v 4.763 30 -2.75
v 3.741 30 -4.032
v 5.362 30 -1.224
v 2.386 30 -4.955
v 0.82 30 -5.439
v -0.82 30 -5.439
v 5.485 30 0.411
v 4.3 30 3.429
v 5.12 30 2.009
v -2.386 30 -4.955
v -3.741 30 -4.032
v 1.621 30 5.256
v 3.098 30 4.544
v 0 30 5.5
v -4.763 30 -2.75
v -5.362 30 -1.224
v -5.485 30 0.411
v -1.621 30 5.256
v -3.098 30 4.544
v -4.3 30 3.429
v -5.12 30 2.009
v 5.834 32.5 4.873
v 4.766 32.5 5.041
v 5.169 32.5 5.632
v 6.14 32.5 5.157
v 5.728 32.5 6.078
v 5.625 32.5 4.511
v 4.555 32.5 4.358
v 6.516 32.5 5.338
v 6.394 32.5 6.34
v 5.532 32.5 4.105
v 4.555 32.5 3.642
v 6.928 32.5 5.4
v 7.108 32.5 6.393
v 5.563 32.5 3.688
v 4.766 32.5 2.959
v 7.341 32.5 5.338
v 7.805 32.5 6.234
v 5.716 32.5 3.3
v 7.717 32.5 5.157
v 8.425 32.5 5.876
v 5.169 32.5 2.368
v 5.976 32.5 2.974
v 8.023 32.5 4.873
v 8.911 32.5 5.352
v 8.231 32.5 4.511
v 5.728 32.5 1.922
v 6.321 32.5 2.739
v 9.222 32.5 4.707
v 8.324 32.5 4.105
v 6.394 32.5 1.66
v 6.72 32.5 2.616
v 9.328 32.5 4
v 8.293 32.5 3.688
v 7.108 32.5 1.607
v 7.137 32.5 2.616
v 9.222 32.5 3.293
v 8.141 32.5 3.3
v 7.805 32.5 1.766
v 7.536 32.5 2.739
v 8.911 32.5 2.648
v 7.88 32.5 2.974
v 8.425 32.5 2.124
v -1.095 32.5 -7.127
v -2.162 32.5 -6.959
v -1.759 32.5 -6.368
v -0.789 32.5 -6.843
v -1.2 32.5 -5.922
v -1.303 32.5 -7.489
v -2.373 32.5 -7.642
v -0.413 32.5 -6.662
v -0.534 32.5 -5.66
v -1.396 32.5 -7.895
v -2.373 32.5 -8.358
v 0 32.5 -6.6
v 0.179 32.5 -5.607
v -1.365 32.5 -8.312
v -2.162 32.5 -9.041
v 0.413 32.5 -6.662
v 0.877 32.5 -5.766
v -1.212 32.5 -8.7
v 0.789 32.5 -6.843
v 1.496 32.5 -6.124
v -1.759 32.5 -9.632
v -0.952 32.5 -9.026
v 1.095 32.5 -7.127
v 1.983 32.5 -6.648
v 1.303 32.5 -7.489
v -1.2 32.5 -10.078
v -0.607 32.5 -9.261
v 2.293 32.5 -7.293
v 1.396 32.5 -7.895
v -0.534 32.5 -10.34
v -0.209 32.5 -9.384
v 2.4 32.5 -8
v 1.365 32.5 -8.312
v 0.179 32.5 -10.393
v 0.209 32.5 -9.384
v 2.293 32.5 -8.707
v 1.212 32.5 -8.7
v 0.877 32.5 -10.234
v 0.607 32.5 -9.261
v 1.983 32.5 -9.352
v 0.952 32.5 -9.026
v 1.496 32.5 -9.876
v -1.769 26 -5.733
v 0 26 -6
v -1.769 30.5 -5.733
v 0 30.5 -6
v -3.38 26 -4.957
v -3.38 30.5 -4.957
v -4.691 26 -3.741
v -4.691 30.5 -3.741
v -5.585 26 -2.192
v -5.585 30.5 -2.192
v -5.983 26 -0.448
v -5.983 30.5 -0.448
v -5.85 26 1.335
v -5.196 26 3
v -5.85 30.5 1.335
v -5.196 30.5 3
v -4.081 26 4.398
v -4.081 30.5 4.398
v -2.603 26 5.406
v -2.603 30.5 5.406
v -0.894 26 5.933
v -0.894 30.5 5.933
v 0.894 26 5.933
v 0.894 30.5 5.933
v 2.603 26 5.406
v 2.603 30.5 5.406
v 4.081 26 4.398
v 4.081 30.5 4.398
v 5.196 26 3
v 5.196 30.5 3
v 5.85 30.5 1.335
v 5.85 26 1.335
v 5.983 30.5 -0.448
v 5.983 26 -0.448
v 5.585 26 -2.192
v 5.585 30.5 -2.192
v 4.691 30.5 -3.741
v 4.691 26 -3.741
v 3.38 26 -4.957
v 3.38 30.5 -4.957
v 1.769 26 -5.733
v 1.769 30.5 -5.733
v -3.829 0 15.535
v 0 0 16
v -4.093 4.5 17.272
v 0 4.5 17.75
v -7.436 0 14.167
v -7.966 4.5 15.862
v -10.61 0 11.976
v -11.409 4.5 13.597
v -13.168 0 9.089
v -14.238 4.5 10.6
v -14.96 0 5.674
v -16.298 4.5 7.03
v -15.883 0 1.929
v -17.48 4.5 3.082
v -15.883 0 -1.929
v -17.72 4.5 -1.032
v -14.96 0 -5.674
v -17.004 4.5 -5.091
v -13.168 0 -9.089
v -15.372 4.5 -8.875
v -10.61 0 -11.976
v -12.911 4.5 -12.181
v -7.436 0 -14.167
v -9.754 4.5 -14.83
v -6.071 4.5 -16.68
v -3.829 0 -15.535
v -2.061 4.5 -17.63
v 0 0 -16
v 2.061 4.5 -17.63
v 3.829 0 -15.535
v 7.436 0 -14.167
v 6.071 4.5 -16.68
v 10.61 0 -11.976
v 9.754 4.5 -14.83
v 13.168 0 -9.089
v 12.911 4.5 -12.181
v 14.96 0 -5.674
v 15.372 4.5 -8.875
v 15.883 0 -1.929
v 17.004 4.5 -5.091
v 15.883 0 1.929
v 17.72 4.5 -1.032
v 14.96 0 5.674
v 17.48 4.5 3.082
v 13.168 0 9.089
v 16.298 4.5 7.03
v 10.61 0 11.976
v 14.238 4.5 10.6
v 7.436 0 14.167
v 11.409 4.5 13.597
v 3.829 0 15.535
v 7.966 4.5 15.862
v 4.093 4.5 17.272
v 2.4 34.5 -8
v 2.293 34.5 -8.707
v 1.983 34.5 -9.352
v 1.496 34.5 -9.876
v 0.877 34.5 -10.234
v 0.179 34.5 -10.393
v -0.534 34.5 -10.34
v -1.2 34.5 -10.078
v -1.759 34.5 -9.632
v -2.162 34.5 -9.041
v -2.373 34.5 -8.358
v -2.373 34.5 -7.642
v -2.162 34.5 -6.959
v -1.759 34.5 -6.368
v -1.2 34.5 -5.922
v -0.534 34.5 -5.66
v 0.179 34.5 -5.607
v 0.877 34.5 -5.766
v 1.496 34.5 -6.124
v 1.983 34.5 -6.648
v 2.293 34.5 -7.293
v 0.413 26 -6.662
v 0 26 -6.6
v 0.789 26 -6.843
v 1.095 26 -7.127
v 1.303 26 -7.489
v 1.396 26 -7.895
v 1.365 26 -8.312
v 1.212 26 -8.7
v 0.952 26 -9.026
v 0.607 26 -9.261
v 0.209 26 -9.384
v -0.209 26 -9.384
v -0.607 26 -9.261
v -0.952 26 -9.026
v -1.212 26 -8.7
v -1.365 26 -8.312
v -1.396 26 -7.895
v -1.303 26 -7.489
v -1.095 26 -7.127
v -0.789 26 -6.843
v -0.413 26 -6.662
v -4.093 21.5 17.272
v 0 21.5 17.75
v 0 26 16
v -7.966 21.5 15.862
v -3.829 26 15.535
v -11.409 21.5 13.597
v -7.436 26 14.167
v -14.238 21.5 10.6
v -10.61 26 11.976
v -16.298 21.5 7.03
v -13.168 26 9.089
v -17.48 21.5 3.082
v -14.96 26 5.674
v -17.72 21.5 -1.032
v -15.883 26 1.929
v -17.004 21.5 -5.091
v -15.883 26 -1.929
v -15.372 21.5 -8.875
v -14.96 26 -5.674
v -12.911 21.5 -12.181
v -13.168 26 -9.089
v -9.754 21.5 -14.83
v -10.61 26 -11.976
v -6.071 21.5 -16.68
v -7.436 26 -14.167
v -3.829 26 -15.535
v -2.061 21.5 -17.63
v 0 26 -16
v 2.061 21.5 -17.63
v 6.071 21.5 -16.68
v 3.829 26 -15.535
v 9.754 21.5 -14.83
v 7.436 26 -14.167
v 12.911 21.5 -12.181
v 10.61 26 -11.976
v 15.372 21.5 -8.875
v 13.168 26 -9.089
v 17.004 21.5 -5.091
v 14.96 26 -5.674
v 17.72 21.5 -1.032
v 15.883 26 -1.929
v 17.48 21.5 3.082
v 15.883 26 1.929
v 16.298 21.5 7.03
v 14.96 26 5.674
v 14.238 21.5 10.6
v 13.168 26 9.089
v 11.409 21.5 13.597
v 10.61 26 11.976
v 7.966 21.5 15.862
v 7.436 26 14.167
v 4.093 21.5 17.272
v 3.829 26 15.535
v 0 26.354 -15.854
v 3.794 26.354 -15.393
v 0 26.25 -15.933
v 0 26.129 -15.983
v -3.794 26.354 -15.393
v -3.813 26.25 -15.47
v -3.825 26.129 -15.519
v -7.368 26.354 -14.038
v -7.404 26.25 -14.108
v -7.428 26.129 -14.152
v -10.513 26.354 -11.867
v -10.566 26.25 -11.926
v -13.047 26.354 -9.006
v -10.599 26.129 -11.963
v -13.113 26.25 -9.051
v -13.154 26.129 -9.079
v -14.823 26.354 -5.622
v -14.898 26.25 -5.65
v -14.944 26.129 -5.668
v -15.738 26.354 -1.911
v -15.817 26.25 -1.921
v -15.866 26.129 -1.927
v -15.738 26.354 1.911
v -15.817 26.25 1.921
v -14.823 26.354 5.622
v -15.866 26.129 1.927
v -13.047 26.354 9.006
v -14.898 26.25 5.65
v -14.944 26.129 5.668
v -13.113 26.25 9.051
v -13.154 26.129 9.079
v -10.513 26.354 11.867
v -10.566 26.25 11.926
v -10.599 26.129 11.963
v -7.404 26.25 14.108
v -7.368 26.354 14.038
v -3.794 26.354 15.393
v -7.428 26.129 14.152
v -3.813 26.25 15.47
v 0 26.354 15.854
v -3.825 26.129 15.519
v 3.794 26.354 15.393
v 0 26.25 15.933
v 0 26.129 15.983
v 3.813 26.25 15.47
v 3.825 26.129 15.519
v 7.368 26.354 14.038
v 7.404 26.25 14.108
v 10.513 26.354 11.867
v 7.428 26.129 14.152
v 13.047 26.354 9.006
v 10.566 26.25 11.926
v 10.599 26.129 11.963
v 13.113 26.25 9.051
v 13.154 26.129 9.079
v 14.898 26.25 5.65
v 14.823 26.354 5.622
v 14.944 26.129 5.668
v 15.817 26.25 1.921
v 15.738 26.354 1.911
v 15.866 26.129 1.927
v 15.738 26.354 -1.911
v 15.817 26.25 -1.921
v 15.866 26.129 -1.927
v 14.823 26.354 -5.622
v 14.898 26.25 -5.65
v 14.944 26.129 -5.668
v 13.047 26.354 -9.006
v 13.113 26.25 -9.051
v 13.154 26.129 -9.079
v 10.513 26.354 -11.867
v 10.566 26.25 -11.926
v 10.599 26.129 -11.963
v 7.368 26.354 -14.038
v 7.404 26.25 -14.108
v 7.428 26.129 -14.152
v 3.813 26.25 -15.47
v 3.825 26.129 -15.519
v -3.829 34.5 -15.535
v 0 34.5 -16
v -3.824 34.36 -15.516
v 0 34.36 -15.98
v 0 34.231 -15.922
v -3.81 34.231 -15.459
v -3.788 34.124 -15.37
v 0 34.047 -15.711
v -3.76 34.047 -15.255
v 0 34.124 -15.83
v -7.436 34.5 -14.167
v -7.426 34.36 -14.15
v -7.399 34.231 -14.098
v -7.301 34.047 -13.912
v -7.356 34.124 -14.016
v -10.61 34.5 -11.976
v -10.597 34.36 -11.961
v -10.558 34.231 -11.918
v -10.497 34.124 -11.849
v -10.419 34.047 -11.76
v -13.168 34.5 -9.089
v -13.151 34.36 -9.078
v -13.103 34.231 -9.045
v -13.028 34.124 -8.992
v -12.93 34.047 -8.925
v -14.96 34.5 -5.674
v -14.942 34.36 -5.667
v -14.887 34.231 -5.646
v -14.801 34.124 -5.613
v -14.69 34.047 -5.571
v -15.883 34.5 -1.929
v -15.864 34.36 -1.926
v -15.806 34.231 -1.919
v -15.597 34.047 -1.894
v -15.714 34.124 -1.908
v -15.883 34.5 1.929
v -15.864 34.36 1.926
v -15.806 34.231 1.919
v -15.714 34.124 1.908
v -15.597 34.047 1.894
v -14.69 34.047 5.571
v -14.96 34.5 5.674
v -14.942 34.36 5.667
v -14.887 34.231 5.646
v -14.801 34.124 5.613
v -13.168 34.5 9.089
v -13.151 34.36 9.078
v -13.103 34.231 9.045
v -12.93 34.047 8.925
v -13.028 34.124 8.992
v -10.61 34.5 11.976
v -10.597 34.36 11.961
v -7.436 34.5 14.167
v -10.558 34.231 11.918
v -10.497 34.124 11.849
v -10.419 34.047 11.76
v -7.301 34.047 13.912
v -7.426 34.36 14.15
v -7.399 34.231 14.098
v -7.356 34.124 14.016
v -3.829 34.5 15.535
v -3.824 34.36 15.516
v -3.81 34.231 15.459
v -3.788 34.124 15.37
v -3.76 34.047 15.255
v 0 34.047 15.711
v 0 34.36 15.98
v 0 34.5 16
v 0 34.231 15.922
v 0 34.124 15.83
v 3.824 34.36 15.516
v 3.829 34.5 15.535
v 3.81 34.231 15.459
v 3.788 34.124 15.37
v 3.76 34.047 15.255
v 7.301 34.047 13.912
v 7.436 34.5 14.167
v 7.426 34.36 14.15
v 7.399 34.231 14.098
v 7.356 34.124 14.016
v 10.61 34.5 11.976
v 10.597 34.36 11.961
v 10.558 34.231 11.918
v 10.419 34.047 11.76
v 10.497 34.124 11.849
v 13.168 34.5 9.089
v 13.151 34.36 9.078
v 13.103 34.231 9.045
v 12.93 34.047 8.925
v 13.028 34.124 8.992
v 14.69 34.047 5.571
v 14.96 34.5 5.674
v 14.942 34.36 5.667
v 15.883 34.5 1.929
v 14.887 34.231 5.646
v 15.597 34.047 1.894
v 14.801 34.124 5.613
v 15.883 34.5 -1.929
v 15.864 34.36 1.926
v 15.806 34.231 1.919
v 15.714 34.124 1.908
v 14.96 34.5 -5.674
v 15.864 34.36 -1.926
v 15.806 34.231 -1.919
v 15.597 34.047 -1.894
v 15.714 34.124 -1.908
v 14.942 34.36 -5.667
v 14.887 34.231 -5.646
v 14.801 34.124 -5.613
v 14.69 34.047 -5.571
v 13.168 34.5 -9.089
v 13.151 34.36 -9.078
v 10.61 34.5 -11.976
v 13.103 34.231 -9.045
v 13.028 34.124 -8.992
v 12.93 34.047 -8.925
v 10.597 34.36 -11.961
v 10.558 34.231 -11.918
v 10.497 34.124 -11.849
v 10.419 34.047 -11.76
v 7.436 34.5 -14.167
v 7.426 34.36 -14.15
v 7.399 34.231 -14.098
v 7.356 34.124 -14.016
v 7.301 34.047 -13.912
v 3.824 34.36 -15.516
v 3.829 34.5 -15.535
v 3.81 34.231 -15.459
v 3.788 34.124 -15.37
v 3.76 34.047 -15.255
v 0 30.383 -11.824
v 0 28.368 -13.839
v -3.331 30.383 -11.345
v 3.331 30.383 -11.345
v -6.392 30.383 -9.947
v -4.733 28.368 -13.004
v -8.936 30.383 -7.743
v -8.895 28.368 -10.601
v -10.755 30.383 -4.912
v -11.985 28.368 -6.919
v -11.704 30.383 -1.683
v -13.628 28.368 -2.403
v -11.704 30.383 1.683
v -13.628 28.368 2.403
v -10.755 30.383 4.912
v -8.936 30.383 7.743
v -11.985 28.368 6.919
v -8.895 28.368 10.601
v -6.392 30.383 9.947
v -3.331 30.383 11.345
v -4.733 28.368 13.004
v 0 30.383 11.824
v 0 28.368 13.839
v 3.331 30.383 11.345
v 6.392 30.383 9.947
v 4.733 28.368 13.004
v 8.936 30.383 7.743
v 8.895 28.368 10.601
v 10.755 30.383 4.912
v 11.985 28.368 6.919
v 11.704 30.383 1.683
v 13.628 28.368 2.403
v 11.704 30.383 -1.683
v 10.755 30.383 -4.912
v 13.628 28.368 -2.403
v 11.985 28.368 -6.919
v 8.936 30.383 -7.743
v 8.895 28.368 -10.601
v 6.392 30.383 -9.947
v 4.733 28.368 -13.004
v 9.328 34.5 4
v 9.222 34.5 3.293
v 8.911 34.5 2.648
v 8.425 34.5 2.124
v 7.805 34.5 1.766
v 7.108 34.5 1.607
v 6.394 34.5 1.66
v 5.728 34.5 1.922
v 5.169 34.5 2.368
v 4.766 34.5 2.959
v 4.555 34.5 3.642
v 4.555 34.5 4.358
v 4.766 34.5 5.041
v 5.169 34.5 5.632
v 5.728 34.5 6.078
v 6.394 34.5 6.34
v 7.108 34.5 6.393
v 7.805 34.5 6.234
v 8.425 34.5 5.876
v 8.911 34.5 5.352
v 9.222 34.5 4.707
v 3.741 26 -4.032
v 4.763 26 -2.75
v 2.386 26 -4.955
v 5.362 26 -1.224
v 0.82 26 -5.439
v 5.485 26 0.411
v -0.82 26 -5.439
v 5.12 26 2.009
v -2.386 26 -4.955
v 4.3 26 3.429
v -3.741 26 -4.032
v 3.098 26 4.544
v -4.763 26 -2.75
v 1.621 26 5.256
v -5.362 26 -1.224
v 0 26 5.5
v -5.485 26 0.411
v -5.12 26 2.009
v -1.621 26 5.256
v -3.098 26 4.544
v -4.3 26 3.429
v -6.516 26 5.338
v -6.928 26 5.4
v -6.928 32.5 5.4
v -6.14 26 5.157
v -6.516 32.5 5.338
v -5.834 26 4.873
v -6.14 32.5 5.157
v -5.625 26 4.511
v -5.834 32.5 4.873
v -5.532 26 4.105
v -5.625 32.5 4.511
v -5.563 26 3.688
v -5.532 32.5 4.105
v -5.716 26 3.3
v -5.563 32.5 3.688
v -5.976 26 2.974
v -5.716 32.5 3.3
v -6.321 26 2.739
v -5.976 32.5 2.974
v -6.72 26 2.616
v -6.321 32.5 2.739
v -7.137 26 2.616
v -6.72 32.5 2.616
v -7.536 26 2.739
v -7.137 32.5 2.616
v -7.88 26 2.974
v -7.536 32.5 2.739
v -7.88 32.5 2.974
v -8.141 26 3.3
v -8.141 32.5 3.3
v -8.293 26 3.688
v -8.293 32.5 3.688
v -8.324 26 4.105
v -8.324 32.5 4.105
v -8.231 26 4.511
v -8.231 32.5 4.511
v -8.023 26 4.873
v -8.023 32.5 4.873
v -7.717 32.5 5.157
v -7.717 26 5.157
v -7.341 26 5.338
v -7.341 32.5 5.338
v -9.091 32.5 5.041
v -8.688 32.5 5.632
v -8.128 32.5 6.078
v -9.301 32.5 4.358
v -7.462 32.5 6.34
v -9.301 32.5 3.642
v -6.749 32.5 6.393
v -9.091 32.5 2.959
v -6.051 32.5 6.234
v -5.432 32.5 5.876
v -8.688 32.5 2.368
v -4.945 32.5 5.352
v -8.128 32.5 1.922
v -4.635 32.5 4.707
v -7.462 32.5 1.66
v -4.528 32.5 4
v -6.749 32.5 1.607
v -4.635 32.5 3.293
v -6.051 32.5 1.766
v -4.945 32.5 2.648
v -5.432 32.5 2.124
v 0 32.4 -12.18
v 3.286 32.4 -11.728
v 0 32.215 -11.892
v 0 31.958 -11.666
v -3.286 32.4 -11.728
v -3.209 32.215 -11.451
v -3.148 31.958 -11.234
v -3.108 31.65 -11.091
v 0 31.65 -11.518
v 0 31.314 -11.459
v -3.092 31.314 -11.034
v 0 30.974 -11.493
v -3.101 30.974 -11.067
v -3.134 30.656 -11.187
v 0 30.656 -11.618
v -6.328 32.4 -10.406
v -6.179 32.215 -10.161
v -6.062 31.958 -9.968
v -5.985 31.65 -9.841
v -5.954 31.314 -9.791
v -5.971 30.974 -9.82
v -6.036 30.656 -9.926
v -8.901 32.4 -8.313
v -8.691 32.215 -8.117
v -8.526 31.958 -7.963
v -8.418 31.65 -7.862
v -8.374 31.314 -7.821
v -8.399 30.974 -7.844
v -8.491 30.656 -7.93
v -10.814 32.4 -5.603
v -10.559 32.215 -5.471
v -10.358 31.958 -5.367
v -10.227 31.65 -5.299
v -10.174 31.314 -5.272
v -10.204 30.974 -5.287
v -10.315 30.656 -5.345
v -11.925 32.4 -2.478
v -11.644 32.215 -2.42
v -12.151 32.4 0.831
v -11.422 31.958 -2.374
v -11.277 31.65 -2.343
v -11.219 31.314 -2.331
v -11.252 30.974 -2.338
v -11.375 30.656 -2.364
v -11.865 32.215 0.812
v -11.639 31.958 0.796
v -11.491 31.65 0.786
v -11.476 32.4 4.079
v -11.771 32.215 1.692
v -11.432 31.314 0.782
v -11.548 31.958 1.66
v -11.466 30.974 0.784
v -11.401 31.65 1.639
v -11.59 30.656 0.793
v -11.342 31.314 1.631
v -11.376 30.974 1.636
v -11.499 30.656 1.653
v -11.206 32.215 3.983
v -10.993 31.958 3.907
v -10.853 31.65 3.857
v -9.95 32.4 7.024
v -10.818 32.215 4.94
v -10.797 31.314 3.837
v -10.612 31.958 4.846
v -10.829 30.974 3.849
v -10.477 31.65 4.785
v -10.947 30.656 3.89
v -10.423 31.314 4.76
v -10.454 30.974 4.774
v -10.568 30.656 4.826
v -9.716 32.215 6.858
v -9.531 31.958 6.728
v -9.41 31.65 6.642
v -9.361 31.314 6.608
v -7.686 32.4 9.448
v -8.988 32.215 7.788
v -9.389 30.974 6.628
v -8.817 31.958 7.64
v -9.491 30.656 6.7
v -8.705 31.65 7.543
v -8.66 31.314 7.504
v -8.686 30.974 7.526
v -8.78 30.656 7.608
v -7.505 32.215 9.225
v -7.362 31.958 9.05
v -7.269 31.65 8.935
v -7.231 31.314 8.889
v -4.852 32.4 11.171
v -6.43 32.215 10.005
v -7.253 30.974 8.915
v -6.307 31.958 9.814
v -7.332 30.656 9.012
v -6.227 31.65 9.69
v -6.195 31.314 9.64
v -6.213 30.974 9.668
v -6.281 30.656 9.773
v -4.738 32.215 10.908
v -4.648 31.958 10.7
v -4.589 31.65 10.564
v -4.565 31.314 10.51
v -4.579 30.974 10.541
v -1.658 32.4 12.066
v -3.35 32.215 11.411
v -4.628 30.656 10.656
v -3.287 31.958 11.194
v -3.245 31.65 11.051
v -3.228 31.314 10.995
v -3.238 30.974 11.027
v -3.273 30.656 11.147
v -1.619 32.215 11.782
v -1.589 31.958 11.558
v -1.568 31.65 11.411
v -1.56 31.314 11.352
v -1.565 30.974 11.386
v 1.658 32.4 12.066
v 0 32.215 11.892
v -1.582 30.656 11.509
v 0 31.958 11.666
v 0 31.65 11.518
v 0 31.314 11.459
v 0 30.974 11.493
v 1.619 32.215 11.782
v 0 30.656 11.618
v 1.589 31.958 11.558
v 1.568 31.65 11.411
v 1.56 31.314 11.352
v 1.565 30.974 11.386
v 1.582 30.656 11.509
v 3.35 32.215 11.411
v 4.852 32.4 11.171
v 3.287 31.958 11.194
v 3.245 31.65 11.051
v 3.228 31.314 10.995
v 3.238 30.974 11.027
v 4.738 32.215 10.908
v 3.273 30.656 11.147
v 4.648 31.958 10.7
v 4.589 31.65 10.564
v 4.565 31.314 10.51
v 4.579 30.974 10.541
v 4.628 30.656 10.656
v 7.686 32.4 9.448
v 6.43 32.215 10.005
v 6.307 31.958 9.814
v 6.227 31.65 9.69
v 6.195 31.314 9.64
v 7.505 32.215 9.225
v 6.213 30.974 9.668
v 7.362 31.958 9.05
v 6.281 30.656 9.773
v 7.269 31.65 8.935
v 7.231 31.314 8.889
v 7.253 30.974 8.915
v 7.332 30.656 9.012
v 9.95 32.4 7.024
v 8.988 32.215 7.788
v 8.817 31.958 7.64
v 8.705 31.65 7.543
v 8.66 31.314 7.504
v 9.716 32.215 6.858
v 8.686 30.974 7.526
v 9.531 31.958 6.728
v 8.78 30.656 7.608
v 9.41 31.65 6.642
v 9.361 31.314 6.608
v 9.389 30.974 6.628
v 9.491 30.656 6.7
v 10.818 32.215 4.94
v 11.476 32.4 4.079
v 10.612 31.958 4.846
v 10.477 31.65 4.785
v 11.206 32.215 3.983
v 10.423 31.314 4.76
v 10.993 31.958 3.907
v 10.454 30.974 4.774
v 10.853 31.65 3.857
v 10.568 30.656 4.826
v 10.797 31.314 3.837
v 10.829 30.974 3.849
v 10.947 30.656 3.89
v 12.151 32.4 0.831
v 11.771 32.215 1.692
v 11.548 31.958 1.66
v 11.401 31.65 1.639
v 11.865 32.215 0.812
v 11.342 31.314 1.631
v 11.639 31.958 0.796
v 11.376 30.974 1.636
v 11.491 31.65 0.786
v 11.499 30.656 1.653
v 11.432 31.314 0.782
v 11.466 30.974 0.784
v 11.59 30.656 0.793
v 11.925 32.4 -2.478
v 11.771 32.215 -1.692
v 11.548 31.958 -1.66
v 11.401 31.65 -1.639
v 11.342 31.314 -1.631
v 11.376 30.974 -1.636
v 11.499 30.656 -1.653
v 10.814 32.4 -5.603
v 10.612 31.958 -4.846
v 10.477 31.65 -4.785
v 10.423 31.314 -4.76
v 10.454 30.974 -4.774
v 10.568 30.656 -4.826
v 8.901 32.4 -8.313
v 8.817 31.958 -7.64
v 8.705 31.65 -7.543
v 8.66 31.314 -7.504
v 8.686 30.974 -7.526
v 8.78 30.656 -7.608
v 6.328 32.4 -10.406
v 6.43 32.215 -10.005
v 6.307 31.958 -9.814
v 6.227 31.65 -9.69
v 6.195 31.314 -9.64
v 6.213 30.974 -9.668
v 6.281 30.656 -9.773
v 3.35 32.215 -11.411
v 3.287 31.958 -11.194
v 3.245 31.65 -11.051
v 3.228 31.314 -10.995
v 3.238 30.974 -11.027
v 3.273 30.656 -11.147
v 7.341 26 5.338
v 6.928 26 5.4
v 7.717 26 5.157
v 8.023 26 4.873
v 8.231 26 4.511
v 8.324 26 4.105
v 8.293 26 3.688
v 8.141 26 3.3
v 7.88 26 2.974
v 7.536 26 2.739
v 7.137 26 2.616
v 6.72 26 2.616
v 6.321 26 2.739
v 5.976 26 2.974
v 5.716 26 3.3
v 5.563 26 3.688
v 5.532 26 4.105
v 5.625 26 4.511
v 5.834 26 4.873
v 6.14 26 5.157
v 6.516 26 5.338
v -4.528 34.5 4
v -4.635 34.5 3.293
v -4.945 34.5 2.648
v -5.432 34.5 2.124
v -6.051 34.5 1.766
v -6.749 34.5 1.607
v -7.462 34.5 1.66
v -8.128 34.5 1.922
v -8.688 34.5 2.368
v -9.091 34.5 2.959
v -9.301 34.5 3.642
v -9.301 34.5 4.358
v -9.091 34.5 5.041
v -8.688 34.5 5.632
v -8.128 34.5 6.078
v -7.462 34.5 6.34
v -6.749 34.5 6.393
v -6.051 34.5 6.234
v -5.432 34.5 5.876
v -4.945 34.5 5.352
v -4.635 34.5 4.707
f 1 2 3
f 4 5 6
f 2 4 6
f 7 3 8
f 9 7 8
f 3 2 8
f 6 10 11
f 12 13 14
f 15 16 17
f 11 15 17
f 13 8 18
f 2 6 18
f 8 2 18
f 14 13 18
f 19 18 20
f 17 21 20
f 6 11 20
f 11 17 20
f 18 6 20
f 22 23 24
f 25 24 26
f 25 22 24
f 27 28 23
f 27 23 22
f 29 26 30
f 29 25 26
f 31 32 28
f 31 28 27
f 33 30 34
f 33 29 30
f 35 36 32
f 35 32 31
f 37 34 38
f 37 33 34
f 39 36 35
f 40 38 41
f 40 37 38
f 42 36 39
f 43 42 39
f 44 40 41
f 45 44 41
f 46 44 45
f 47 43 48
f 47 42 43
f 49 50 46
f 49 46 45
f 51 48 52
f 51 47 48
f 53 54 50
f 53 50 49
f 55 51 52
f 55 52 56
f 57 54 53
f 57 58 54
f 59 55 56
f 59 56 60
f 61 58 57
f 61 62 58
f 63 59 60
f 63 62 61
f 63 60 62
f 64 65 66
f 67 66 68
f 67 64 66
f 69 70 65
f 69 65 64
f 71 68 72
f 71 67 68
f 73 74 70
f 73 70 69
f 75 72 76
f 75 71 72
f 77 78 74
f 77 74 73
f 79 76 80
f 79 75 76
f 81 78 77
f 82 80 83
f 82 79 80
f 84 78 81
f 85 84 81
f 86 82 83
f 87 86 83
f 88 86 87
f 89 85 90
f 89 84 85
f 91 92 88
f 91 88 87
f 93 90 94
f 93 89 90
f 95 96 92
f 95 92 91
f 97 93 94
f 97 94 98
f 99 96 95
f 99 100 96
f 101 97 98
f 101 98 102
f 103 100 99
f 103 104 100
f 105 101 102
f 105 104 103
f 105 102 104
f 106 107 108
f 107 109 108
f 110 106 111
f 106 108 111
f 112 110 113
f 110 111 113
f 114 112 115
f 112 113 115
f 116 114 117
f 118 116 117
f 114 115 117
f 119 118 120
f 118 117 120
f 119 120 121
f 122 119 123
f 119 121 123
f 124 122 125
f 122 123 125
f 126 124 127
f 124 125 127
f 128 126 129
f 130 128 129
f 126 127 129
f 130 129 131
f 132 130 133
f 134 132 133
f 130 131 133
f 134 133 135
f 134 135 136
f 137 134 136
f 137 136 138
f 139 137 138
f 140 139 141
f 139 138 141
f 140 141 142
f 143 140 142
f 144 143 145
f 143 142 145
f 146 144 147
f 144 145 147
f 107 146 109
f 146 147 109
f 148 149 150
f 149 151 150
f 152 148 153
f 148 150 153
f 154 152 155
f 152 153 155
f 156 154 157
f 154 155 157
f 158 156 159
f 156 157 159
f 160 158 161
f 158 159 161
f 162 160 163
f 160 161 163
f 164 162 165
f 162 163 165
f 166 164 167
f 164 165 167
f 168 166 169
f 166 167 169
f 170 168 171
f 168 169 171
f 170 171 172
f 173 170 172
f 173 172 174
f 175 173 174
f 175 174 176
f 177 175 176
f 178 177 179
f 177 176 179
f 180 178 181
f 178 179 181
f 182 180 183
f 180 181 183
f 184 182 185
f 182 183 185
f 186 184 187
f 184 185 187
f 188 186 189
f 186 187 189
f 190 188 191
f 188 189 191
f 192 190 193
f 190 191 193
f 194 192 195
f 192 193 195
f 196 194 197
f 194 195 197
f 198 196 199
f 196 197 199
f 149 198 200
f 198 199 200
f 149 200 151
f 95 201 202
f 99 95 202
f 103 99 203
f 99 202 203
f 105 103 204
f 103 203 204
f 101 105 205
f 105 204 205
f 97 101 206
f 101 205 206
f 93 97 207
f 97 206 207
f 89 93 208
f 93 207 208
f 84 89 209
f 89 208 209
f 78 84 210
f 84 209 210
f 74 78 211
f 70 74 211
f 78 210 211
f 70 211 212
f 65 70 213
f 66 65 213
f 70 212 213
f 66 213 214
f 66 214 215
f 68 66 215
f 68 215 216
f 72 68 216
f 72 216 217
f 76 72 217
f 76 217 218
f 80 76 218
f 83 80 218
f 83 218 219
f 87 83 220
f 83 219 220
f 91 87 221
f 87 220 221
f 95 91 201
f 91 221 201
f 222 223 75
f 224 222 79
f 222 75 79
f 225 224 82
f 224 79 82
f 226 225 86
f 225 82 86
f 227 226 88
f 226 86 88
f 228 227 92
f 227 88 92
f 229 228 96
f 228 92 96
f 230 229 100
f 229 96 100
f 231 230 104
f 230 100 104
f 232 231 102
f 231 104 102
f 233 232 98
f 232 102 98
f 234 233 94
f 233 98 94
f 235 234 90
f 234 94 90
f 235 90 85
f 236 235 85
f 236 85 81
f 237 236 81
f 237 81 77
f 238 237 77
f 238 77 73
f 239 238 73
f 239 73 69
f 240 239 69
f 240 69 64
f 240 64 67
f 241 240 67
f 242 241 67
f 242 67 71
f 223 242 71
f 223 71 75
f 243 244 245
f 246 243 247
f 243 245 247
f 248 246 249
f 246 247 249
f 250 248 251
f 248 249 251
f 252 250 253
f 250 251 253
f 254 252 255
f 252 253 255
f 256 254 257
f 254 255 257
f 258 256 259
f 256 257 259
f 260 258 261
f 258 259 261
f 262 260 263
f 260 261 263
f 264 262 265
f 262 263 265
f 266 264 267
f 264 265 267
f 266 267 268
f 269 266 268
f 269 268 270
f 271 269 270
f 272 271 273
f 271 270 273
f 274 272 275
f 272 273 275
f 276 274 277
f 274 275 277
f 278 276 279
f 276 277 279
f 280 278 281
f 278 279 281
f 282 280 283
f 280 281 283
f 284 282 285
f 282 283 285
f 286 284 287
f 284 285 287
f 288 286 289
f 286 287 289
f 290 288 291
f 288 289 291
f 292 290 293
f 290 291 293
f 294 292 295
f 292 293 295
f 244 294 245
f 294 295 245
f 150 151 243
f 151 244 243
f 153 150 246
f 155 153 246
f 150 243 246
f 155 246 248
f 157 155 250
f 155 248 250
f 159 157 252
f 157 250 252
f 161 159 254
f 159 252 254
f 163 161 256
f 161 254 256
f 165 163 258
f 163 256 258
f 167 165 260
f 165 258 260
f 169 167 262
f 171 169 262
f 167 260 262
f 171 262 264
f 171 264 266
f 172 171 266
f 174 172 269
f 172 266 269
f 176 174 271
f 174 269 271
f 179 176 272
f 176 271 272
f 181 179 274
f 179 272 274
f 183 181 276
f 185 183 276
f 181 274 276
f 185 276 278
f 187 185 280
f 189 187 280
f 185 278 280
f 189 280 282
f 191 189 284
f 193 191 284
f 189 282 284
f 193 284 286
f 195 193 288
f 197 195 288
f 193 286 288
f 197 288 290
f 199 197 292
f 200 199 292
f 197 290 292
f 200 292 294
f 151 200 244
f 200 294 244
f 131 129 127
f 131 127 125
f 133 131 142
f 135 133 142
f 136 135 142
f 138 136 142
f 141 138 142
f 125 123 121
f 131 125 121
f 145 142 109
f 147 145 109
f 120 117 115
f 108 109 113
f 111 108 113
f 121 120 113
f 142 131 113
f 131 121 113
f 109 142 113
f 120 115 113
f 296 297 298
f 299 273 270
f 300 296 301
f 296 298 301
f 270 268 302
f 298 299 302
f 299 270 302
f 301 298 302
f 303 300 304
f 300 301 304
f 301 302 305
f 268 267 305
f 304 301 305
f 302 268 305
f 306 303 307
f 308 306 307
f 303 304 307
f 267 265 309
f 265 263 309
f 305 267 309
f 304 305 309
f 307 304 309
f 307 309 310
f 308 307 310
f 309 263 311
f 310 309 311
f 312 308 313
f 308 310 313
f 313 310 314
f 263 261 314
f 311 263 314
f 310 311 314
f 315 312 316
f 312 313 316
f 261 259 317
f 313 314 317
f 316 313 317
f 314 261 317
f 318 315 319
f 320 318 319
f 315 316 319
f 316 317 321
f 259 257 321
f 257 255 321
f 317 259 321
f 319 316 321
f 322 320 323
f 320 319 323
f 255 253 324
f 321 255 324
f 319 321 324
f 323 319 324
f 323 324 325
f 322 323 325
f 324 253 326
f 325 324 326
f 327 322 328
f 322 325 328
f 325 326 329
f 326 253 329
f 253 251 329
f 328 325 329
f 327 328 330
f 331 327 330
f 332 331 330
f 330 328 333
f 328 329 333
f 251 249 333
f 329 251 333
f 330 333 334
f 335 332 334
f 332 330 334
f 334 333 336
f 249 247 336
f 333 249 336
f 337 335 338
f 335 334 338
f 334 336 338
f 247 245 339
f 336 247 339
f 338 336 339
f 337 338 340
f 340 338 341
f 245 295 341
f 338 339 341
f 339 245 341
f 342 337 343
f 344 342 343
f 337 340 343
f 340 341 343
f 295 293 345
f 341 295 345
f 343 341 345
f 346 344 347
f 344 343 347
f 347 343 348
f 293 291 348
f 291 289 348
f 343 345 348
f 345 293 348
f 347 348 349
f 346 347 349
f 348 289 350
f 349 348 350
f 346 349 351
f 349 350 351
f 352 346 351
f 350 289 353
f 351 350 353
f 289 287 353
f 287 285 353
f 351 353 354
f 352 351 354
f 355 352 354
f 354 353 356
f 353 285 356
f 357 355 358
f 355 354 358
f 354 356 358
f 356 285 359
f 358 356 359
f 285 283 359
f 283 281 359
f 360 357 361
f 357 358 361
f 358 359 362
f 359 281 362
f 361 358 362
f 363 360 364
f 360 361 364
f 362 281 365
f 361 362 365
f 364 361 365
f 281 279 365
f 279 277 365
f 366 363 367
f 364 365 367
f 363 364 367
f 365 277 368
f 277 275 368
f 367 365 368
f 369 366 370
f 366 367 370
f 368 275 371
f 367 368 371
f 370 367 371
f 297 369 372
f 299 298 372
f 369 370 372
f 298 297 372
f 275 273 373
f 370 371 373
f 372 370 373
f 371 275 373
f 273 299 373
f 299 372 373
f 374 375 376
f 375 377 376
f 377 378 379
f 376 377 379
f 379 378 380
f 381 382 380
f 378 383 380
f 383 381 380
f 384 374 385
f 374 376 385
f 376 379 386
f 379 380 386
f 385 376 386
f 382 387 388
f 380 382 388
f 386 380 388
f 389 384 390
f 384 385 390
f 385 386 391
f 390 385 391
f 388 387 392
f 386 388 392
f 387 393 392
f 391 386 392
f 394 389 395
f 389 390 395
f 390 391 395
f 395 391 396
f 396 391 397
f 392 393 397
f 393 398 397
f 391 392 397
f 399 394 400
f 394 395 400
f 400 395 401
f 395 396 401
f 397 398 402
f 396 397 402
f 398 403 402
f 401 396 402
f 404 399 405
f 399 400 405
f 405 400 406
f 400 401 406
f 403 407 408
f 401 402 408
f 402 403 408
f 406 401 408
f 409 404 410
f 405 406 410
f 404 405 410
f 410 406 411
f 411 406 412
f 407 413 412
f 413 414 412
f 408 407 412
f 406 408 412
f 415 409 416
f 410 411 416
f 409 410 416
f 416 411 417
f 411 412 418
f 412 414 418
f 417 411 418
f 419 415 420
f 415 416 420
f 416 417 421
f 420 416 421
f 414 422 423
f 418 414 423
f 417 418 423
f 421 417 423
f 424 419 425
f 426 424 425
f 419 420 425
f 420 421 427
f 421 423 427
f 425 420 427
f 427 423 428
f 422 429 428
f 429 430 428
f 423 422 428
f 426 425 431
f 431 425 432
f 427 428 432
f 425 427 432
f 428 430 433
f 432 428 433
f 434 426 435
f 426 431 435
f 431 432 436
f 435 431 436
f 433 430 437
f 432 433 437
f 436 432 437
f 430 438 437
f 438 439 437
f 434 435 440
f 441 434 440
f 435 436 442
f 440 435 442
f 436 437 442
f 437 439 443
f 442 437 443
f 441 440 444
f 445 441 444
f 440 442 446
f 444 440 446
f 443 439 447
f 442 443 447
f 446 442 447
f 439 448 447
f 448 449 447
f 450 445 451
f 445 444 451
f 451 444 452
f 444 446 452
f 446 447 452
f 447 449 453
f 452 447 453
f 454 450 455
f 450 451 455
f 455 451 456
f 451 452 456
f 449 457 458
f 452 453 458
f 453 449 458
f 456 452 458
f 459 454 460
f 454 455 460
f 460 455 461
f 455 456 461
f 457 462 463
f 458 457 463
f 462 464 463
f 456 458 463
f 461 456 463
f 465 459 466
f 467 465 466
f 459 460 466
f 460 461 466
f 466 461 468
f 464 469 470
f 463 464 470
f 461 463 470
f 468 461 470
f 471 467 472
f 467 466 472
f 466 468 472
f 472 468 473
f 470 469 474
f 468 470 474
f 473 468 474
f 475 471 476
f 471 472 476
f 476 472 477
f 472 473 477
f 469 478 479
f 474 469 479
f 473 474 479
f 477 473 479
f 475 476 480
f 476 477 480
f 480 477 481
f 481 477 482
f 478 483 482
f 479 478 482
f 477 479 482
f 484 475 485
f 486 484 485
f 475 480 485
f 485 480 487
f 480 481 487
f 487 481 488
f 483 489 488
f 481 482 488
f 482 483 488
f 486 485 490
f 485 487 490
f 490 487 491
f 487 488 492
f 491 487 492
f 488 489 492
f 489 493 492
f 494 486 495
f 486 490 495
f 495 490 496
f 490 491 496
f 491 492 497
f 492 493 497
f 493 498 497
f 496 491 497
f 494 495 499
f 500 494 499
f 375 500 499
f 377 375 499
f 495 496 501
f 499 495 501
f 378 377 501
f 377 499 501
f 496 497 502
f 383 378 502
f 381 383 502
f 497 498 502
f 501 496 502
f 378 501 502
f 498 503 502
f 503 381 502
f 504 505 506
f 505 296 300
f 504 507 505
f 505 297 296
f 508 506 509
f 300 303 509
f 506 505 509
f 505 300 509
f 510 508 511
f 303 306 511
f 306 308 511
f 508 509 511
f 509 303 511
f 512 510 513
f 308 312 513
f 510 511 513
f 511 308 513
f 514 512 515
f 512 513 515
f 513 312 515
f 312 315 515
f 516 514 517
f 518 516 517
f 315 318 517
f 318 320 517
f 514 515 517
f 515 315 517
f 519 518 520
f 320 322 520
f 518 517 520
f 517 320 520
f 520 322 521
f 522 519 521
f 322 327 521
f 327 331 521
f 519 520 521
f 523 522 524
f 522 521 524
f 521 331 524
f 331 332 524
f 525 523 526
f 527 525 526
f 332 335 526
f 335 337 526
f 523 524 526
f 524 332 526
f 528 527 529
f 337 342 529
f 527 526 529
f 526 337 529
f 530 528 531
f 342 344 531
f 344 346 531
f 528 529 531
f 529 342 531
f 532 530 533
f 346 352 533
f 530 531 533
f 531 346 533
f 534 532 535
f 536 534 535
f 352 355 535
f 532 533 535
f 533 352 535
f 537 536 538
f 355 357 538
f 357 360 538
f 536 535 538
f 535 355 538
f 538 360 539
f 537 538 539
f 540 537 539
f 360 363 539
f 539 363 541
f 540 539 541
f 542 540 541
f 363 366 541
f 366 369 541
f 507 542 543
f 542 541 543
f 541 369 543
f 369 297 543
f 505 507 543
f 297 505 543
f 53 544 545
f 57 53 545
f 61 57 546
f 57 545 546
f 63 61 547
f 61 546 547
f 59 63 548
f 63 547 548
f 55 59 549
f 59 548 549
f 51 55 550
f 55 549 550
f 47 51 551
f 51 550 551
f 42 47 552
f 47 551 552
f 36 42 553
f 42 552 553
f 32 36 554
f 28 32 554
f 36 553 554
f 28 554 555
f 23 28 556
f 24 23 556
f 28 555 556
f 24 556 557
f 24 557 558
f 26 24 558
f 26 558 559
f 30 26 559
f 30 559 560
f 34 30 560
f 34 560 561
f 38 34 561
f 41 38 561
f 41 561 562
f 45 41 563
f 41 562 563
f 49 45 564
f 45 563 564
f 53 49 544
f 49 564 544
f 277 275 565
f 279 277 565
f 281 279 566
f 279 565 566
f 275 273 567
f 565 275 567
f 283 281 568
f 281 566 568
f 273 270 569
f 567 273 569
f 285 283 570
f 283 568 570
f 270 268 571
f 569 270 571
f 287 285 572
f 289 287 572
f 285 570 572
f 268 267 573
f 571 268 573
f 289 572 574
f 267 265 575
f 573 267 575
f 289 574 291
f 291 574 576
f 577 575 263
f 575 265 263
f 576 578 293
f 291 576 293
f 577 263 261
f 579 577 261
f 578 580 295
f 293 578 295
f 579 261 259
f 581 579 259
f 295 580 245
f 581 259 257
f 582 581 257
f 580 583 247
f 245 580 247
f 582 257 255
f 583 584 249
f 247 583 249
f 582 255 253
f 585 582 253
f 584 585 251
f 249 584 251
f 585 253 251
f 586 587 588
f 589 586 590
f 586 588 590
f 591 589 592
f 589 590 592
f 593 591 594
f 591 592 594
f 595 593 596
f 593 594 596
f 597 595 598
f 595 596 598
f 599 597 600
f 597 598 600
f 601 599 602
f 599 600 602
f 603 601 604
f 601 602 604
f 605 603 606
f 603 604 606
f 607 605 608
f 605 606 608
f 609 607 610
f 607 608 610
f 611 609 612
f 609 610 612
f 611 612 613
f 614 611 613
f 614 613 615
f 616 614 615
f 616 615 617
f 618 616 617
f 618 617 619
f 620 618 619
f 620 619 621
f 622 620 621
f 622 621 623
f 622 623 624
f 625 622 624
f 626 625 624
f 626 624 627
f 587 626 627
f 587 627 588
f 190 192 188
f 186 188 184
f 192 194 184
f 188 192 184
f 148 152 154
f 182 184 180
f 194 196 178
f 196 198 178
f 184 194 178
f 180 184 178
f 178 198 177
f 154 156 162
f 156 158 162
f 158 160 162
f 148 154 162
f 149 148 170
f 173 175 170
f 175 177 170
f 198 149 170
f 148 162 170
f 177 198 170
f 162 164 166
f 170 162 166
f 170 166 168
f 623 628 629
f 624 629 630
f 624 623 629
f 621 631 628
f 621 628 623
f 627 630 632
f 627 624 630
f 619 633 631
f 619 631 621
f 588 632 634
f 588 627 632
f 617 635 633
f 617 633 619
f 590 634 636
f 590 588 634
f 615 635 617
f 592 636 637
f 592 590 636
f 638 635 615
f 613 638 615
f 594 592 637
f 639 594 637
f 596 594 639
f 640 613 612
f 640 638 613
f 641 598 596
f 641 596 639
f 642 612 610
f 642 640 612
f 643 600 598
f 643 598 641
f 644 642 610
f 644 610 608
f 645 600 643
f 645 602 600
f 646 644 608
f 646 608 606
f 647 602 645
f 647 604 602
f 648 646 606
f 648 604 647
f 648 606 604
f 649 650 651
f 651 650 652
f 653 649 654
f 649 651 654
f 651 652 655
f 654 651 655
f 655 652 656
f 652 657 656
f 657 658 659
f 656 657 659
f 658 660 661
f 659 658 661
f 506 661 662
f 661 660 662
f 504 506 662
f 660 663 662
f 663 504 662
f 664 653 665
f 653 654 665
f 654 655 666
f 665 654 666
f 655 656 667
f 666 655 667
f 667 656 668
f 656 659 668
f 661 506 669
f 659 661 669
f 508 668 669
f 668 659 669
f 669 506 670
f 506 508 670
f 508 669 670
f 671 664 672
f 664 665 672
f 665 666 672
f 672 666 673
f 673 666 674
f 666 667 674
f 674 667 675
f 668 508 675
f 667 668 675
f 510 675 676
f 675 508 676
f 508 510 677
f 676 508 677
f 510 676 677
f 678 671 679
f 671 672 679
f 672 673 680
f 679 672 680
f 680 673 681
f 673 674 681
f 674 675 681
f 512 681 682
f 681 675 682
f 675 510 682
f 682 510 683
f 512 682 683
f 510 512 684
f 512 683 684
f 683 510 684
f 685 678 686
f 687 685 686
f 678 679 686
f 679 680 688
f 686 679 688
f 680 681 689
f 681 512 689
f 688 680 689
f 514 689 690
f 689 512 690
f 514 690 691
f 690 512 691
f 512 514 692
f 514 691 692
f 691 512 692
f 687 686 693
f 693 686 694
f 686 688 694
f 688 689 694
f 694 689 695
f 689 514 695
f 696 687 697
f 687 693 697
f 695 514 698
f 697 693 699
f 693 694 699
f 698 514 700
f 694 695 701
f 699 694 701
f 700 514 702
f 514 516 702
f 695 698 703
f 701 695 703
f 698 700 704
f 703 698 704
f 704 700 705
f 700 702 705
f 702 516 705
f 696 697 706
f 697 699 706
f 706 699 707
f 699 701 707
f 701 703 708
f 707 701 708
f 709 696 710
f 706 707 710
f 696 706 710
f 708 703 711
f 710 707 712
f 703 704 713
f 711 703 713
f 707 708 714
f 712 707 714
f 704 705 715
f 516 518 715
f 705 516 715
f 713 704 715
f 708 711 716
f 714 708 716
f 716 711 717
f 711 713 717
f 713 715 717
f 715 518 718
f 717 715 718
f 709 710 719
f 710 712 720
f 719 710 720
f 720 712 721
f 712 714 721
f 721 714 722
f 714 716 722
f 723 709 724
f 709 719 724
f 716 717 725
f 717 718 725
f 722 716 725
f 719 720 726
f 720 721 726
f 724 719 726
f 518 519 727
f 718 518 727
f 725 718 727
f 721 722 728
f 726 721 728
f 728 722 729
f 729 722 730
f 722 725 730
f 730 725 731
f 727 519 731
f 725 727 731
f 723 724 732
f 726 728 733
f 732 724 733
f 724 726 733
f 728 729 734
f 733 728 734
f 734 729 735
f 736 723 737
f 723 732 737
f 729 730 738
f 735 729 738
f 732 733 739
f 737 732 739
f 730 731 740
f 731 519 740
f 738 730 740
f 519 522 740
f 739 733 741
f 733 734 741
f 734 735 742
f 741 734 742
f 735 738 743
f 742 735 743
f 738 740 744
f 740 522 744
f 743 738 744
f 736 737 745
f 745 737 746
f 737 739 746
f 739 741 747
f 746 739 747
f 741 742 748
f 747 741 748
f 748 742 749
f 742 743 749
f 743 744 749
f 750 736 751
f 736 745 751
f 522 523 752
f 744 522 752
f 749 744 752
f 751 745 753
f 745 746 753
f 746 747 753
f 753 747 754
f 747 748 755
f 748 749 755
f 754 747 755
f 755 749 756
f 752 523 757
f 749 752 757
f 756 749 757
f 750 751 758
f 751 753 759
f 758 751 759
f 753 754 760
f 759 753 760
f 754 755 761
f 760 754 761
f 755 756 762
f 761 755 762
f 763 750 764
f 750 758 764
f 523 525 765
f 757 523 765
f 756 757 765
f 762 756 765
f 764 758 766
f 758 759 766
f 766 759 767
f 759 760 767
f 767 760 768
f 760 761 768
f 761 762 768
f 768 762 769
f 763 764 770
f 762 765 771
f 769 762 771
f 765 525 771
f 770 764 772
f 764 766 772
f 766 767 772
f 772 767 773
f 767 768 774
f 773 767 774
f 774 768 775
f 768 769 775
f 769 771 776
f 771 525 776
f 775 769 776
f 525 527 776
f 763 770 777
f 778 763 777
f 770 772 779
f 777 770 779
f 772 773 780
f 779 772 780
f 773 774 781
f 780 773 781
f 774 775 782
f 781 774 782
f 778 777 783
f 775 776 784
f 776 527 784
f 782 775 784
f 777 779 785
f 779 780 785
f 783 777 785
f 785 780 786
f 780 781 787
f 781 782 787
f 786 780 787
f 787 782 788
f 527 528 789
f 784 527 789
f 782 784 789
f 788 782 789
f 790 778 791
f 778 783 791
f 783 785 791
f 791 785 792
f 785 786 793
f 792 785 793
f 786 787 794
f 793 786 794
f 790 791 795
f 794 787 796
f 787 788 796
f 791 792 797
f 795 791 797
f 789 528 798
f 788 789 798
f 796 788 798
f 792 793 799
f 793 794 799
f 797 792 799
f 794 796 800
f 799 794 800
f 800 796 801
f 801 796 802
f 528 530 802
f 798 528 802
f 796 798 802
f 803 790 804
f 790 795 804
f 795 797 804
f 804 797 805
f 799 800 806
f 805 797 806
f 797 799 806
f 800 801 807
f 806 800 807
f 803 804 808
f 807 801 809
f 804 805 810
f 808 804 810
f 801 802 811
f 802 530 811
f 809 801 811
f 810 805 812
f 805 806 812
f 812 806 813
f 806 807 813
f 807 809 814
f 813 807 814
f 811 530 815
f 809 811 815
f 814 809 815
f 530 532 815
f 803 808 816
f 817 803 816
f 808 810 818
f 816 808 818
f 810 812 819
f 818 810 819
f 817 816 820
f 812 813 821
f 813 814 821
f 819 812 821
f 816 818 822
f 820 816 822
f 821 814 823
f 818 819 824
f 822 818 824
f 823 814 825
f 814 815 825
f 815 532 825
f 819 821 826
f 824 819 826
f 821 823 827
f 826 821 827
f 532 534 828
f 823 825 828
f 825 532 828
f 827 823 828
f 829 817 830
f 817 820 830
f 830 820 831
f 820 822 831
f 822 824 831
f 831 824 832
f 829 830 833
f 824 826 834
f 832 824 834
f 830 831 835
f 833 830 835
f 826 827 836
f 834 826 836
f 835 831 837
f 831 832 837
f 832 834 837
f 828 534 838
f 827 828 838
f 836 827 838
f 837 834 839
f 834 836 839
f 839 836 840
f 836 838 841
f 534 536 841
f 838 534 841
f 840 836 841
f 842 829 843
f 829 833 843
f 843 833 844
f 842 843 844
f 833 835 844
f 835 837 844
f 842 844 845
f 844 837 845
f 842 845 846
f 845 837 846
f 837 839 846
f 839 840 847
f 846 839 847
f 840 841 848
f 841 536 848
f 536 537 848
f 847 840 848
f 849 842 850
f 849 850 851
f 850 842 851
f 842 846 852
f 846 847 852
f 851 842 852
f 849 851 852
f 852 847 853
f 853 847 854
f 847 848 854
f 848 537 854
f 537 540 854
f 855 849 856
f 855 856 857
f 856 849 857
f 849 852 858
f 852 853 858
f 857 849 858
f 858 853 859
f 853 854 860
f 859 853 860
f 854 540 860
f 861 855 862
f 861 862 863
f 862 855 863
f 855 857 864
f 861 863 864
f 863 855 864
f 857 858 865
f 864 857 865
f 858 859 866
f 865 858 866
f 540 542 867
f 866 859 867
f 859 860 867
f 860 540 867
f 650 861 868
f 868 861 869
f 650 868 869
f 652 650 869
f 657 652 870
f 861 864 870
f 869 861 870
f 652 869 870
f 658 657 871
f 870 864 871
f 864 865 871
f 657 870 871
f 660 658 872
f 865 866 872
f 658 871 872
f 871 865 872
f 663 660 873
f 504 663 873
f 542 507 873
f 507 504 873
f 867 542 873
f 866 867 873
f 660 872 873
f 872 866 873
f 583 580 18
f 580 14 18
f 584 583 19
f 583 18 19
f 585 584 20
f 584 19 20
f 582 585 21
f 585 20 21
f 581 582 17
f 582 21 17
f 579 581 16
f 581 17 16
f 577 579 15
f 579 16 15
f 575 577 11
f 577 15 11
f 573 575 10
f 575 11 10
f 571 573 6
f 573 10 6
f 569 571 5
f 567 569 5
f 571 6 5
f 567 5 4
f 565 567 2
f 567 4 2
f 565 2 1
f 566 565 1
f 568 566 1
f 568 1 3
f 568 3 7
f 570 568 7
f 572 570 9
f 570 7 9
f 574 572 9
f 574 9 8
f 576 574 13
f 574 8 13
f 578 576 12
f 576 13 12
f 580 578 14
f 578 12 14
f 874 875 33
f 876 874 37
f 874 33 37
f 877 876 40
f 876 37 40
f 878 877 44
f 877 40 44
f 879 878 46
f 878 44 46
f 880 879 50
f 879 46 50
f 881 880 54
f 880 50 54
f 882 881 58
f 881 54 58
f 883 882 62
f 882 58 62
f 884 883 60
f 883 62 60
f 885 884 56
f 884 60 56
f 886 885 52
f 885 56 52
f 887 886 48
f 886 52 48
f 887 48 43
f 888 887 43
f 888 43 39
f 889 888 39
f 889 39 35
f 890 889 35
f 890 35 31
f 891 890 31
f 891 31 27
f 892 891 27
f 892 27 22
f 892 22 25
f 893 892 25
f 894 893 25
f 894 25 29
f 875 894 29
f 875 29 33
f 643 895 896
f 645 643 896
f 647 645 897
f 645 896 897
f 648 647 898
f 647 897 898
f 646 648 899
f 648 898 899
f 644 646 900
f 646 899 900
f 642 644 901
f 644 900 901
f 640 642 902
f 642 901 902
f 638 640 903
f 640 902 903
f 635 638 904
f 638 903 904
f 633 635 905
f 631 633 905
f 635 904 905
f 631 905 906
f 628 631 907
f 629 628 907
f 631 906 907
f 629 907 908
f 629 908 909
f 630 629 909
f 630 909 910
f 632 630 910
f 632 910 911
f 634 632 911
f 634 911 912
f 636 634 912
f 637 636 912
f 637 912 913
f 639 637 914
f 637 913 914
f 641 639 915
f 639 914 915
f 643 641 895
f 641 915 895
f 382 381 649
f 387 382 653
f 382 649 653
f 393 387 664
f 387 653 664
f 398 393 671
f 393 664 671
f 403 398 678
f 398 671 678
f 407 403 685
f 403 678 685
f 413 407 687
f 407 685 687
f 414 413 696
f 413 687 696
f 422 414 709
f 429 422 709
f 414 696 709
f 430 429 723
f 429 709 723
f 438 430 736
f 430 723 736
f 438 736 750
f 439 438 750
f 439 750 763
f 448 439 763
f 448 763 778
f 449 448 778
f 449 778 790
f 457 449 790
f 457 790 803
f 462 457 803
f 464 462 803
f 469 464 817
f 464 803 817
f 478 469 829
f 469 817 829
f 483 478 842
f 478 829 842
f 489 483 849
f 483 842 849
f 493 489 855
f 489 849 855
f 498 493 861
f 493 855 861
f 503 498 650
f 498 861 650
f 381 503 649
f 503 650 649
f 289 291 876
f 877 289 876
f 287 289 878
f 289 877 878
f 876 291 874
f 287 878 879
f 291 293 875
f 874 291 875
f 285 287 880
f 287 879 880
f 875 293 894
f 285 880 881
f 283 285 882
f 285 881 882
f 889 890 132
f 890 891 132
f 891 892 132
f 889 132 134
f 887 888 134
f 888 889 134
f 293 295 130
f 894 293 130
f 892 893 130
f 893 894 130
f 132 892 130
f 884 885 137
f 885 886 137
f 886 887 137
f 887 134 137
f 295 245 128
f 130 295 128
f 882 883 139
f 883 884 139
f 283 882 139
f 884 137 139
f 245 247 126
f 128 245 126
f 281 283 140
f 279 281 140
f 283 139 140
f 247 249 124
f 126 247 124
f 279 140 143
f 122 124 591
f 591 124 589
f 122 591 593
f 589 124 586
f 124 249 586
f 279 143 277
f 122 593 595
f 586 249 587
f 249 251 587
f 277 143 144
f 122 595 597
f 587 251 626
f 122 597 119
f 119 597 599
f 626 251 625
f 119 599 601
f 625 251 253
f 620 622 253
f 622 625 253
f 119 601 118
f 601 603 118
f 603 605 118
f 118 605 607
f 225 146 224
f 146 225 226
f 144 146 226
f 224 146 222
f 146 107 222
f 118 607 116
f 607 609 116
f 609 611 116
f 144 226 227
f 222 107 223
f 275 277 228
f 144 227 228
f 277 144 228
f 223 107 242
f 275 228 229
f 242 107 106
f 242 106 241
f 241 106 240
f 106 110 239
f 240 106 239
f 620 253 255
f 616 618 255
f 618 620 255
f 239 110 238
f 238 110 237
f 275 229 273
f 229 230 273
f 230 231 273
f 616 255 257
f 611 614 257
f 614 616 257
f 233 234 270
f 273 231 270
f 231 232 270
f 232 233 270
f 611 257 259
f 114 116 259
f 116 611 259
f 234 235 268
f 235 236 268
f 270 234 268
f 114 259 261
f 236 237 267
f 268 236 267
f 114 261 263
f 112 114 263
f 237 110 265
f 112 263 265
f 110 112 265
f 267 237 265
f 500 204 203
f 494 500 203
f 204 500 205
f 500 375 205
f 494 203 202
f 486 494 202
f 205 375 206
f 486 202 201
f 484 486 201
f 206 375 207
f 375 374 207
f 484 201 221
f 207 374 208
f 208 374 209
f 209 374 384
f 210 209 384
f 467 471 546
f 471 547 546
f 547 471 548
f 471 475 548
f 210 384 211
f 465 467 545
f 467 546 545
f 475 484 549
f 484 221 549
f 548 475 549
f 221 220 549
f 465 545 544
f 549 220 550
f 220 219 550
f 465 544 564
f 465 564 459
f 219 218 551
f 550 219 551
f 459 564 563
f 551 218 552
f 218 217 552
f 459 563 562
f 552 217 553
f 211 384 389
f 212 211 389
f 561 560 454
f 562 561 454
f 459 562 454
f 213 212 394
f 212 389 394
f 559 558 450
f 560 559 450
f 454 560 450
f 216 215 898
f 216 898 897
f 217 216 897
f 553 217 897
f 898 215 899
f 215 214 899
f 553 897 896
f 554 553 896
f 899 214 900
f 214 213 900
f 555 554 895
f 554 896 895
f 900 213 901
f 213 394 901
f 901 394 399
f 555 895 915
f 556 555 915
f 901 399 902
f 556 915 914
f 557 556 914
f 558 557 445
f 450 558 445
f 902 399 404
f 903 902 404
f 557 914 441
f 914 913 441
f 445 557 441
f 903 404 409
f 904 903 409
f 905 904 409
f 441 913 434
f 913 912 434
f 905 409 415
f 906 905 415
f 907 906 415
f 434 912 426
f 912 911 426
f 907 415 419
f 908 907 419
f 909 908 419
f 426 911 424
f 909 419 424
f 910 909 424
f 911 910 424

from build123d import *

# Parameters (mm, degrees)
SKETCH3_R               = 1.4
CUT_EXTRUDE1_DEPTH      = 10
SKETCH3_2_R             = 2.4
SKETCH3_2_R_2           = 1.4
CUT_EXTRUDE_THIN1_DEPTH = 2


with BuildPart() as part:
    # Sketch1 → Revolve1 (revolve)
    with BuildSketch(Plane(origin=(0, 0, 0), x_dir=(0, 0, -1), z_dir=(1, 0, 0))):
        Polygon((0, 0), (16, 0), (17.75, 4.5), (17.75, 21.5), (16, 26), (5.5, 26), (5.5, 30), (0, 30), align=None)
    revolve(axis=Axis((0, 30, 0), (0, -1, 0)))


with BuildPart() as body_2:
    # Sketch2 → Revolve2 (revolve)
    with BuildSketch(Plane(origin=(0, 0, 0), x_dir=(0, 0, -1), z_dir=(1, 0, 0))):
        with BuildLine():
            Line((-16, 26), (-6, 26))
            Line((-6, 26), (-6, 30.5))
            Line((-6, 30.5), (0, 30.5))
            Line((0, 30.5), (0, 34.5))
            Line((0, 34.5), (-16, 34.5))
            ThreePointArc((-16, 34.5), (-15.921695723, 34.231350196), (-15.711309131, 34.046846106))
            Line((-15.711309131, 34.046846106), (-12.179533539, 32.399952101))
            ThreePointArc((-12.179533539, 32.399952101), (-11.476796675, 31.48412759), (-11.82392289, 30.383183891))
            Line((-11.82392289, 30.383183891), (-15.853553391, 26.353553391))
            ThreePointArc((-15.853553391, 26.353553391), (-15.961939766, 26.191341716), (-16, 26))
        make_face()
    revolve(axis=Axis((0, 30.5, 0), (0, 1, 0)))

    # Sketch3 → Cut-Extrude1 (cut)
    with BuildSketch(Plane(origin=(0, 34.5, 0), x_dir=(1, 0, 0), z_dir=(0, 1, 0))):
        with Locations((0, 8)):
            Circle(SKETCH3_R)
        with Locations((6.92820323, -4)):
            Circle(SKETCH3_R)
        with Locations((-6.92820323, -4)):
            Circle(SKETCH3_R)
    extrude(amount=-CUT_EXTRUDE1_DEPTH, mode=Mode.SUBTRACT)

    # Sketch3<2> → Cut-Extrude-Thin1 (cut)
    # profile 1 of 3: a face of its own
    with BuildSketch(Plane(origin=(0, 34.5, 0), x_dir=(1, 0, 0), z_dir=(0, 1, 0))):
        with Locations((0, 8)):
            Circle(SKETCH3_2_R)
        with Locations((0, 8)):
            Circle(SKETCH3_2_R_2, mode=Mode.SUBTRACT)
    # profile 2 of 3: a face of its own
    with BuildSketch(Plane(origin=(0, 34.5, 0), x_dir=(1, 0, 0), z_dir=(0, 1, 0))):
        with Locations((6.92820323, -4)):
            Circle(SKETCH3_2_R)
        with Locations((6.92820323, -4)):
            Circle(SKETCH3_2_R_2, mode=Mode.SUBTRACT)
    # profile 3 of 3: a face of its own
    with BuildSketch(Plane(origin=(0, 34.5, 0), x_dir=(1, 0, 0), z_dir=(0, 1, 0))):
        with Locations((-6.92820323, -4)):
            Circle(SKETCH3_2_R)
        with Locations((-6.92820323, -4)):
            Circle(SKETCH3_2_R_2, mode=Mode.SUBTRACT)
    extrude(amount=-CUT_EXTRUDE_THIN1_DEPTH, mode=Mode.SUBTRACT)


solid = Compound([part.part, body_2.part])
